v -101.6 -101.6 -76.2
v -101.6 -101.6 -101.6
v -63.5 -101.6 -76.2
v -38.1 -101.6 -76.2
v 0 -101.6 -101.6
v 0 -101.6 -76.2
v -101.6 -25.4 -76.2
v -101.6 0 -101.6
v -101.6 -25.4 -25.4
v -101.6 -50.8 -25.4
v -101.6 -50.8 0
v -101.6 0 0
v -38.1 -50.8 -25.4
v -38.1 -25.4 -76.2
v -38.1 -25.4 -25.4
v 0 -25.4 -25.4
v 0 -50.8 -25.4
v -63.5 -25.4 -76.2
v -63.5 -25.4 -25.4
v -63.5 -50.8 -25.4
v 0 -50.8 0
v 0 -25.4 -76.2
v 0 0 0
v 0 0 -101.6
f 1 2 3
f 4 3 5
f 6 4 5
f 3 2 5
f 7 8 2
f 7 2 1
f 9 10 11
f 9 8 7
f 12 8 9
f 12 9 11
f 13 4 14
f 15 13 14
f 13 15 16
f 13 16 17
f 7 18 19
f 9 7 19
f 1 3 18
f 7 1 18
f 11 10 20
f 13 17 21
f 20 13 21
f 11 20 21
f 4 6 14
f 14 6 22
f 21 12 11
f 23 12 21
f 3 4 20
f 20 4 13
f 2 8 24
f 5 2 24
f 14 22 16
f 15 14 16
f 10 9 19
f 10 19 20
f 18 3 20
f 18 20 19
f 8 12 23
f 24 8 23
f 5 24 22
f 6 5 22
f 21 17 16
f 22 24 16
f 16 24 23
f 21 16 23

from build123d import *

# Parameters (mm, degrees)
F0_W     = 101.6
F0_H     = 101.6
F1_DEPTH = 101.6
F3_DEPTH = 121.666
F4_W     = 25.4
F4_H     = 76.2
F5_DEPTH = 50.8
F7_DEPTH = 99.568


with BuildPart() as f1:
    # F0 (on Front) → F1 (new body)
    with BuildSketch(Plane.XZ):
        with Locations((-50.8, -50.8)):
            Rectangle(F0_W, F0_H)
    extrude(amount=F1_DEPTH)

    # F2 (on face) → F3 (cut)
    with BuildSketch(Plane.YZ):
        Polygon((-50.8, -25.4), (-50.8, 0), (-101.6, 0), (-101.6, -76.2), (-25.4, -76.2), (-25.4, -25.4), align=None)
    extrude(amount=-F3_DEPTH, mode=Mode.SUBTRACT)

    # F4 (on face) → F5 (join)
    with BuildSketch(Plane.XY.offset(-76.2)):
        with Locations((-50.8, -63.5)):
            Rectangle(F4_W, F4_H)
    extrude(amount=F5_DEPTH)

    # F6 (on face) → F7 (cut)
    with BuildSketch(Plane.YZ.offset(-38.1)):
        Polygon((-101.6, -76.2), (-50.8, -25.4), (-92.064753, -25.4), (-101.6, -25.4), align=None)
    extrude(amount=-F7_DEPTH, mode=Mode.SUBTRACT)


solid = f1.part
